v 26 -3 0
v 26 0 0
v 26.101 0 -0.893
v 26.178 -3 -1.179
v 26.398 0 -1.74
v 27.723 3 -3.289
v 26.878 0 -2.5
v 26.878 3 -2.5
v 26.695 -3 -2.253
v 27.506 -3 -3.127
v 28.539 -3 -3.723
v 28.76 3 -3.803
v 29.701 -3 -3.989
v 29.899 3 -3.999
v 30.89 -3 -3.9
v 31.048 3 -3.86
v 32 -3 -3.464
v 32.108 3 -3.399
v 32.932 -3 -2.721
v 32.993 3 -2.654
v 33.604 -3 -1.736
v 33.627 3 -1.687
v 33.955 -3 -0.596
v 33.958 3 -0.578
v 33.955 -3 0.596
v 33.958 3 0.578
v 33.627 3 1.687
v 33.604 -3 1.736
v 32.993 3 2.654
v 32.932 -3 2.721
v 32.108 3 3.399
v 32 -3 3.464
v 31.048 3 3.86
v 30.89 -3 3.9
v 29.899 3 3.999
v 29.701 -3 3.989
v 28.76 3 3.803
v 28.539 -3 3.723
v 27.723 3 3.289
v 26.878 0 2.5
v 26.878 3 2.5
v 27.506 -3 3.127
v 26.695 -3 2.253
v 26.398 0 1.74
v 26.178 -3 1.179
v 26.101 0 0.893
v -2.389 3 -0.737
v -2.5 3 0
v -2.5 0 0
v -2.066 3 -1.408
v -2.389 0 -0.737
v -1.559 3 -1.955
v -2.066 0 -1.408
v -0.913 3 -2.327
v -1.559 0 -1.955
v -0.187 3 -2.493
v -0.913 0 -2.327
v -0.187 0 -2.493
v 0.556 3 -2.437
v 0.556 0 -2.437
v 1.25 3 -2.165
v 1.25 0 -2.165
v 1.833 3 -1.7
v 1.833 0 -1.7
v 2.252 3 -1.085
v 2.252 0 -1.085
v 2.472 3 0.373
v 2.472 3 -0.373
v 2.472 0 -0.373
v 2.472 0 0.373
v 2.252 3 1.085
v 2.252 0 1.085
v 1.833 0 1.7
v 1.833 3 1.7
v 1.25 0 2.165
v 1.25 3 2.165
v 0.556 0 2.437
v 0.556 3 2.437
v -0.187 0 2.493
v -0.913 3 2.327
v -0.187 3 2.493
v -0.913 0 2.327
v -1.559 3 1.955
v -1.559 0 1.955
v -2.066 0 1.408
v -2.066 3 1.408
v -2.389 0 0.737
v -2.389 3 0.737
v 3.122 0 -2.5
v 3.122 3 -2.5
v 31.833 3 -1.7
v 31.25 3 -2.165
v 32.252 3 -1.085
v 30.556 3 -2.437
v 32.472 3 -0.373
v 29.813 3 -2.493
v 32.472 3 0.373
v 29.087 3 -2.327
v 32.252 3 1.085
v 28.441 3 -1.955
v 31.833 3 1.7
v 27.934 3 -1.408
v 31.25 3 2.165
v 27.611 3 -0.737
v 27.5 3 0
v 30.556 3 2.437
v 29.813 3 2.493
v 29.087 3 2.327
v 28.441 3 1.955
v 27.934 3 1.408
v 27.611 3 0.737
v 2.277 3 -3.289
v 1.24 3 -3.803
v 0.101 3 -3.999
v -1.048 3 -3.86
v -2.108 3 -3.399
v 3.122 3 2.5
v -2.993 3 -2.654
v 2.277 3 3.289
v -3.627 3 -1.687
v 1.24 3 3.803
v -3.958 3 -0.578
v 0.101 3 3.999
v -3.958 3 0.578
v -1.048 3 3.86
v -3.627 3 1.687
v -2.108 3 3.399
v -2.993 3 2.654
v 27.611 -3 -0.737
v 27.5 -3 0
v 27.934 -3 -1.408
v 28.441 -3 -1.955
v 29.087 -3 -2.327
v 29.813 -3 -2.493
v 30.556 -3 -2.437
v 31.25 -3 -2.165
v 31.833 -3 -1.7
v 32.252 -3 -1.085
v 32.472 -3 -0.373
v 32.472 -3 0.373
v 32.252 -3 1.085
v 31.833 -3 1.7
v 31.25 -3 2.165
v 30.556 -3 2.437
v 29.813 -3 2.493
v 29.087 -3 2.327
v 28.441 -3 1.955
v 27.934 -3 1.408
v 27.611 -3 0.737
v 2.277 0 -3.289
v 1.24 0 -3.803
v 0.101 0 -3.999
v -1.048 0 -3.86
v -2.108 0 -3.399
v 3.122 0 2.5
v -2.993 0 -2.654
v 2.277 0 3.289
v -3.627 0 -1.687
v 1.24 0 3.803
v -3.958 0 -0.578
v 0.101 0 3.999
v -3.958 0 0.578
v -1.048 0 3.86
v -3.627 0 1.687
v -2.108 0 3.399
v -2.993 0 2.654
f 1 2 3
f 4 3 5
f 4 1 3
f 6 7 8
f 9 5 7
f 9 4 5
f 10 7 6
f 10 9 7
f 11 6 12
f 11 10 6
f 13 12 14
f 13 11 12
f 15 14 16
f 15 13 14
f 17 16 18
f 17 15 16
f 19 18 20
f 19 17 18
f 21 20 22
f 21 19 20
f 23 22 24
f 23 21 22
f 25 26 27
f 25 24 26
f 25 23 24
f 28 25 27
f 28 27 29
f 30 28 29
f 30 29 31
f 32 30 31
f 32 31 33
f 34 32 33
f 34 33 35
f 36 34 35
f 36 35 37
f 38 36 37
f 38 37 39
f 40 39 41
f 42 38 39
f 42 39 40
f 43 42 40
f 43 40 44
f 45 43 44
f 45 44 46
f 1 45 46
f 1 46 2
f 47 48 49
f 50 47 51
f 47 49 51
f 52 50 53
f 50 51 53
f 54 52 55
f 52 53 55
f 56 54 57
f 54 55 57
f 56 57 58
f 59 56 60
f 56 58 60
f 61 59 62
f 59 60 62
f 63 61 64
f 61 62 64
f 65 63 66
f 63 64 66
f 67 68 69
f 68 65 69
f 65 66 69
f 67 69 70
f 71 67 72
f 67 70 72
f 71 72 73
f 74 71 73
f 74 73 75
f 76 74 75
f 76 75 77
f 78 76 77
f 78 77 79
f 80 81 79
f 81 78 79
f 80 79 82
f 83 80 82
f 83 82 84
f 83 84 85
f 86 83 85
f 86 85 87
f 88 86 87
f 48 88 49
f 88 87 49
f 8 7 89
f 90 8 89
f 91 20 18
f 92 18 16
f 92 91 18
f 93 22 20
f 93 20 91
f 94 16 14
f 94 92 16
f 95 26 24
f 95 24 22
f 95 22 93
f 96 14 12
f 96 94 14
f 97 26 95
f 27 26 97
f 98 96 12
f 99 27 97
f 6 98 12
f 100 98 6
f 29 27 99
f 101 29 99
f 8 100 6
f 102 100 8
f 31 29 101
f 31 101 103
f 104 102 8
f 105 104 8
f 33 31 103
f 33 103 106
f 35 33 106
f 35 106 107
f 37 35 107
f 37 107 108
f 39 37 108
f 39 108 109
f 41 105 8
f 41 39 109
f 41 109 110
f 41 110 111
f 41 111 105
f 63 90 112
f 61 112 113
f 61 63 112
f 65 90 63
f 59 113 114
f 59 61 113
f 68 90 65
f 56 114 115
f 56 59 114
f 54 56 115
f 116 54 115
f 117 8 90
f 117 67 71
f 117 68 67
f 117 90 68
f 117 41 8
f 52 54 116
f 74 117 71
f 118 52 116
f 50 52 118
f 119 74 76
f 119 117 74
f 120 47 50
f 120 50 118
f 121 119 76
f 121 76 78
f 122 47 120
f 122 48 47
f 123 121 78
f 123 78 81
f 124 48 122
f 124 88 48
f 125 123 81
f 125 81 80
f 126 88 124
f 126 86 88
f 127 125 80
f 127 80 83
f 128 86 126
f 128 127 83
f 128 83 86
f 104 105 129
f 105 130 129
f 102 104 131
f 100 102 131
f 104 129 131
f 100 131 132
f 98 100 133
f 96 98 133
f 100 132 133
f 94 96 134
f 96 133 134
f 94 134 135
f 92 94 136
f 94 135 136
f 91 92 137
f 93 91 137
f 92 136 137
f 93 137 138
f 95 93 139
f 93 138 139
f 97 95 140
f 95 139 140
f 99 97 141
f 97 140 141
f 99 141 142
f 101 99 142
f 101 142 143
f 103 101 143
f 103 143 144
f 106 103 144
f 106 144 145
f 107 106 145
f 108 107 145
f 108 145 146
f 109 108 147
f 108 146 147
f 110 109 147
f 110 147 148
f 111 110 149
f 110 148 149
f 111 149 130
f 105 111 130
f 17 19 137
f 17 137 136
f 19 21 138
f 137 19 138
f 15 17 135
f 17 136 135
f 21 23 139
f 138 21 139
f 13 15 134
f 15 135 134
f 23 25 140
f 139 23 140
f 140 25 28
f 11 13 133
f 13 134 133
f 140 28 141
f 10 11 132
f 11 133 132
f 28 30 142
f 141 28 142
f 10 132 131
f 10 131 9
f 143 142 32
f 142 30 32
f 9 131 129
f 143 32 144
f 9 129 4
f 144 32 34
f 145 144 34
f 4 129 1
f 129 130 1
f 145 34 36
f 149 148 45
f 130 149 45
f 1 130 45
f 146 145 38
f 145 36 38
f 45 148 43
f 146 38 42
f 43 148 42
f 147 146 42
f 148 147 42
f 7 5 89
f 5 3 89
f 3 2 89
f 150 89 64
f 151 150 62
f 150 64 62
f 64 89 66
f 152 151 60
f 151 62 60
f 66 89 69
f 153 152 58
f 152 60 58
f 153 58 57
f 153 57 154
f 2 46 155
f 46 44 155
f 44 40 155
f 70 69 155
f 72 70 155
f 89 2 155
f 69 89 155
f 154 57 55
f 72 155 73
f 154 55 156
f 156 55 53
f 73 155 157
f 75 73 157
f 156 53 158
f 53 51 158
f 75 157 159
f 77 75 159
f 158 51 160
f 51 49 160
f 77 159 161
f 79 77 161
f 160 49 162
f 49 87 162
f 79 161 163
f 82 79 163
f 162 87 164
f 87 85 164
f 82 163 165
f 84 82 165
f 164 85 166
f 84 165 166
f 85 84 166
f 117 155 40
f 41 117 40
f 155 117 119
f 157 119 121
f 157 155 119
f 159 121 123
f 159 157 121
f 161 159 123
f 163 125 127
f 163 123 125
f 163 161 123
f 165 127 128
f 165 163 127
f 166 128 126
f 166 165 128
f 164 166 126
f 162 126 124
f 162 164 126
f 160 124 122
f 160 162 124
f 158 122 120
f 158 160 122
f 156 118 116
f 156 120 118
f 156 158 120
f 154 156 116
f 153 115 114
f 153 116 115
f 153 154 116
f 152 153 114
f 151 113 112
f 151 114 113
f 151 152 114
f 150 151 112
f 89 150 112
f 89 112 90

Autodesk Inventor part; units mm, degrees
ref_plane "YZ Plane" through (0, 0, 0) normal (1, 0, 0) x (0, 1, 0)
ref_plane "XZ Plane" through (0, 0, 0) normal (0, 1, 0) x (-1, 0, 0)
ref_plane "XY Plane" through (0, 0, 0) normal (0, 0, 1) x (1, 0, 0)
sketch "Sketch1" plane through (0, 0, 0) normal (0, 1, 0) x (-1, 0, 0)
  circle A0 centre (0, 0) radius 2.5
  circle A1 centre (0, 0) radius 4
  circle A2 centre (-30, 0) radius 2.5
  circle A3 centre (-30, 0) radius 4
  line L0 (0, 2.5) -> (-30, 2.5)
  line L1 (-30, 2.5) -> (-30, -2.5)
  line L2 (-30, -2.5) -> (0, -2.5)
  line L3 (0, -2.5) -> (0, 2.5)
  point P0 (-3.4641, 2)
  point P1 (-26.5359, 2)
  point P2 (-26.5359, -2)
  point P3 (-3.4641, -2)
  point P4 (-27.2006, 2.8571)
  point P5 (-2.7994, 2.8571)
  point P6 (-2.7994, -2.8571)
  point P7 (-27.2006, -2.8571)
  point P8 (-26.8775, -2.5)
  point P9 (-3.1225, -2.5)
  point P10 (-3.1225, 2.5)
  point P11 (-26.8775, 2.5)
  dimension "d0" = 5
  dimension "d2" = 5
  dimension "d1" = 8
  dimension "d3" = 8
  dimension "d4" = 30
extrude "Extrusion1" add sketch "Sketch1" along normal blind 3 contours A0 L0 A1 L2 | A0 L2 A1 L0 | A1 L2 A3 L0 | L0 A2 L2 A3 | A3 L2 A2 L0
extrude "Extrusion2" add sketch "Sketch1" against normal blind 3 contours L0 A2 L2 A3 | A3 L2 A2 L0
properties part number "Arm Link_3DPrint"
